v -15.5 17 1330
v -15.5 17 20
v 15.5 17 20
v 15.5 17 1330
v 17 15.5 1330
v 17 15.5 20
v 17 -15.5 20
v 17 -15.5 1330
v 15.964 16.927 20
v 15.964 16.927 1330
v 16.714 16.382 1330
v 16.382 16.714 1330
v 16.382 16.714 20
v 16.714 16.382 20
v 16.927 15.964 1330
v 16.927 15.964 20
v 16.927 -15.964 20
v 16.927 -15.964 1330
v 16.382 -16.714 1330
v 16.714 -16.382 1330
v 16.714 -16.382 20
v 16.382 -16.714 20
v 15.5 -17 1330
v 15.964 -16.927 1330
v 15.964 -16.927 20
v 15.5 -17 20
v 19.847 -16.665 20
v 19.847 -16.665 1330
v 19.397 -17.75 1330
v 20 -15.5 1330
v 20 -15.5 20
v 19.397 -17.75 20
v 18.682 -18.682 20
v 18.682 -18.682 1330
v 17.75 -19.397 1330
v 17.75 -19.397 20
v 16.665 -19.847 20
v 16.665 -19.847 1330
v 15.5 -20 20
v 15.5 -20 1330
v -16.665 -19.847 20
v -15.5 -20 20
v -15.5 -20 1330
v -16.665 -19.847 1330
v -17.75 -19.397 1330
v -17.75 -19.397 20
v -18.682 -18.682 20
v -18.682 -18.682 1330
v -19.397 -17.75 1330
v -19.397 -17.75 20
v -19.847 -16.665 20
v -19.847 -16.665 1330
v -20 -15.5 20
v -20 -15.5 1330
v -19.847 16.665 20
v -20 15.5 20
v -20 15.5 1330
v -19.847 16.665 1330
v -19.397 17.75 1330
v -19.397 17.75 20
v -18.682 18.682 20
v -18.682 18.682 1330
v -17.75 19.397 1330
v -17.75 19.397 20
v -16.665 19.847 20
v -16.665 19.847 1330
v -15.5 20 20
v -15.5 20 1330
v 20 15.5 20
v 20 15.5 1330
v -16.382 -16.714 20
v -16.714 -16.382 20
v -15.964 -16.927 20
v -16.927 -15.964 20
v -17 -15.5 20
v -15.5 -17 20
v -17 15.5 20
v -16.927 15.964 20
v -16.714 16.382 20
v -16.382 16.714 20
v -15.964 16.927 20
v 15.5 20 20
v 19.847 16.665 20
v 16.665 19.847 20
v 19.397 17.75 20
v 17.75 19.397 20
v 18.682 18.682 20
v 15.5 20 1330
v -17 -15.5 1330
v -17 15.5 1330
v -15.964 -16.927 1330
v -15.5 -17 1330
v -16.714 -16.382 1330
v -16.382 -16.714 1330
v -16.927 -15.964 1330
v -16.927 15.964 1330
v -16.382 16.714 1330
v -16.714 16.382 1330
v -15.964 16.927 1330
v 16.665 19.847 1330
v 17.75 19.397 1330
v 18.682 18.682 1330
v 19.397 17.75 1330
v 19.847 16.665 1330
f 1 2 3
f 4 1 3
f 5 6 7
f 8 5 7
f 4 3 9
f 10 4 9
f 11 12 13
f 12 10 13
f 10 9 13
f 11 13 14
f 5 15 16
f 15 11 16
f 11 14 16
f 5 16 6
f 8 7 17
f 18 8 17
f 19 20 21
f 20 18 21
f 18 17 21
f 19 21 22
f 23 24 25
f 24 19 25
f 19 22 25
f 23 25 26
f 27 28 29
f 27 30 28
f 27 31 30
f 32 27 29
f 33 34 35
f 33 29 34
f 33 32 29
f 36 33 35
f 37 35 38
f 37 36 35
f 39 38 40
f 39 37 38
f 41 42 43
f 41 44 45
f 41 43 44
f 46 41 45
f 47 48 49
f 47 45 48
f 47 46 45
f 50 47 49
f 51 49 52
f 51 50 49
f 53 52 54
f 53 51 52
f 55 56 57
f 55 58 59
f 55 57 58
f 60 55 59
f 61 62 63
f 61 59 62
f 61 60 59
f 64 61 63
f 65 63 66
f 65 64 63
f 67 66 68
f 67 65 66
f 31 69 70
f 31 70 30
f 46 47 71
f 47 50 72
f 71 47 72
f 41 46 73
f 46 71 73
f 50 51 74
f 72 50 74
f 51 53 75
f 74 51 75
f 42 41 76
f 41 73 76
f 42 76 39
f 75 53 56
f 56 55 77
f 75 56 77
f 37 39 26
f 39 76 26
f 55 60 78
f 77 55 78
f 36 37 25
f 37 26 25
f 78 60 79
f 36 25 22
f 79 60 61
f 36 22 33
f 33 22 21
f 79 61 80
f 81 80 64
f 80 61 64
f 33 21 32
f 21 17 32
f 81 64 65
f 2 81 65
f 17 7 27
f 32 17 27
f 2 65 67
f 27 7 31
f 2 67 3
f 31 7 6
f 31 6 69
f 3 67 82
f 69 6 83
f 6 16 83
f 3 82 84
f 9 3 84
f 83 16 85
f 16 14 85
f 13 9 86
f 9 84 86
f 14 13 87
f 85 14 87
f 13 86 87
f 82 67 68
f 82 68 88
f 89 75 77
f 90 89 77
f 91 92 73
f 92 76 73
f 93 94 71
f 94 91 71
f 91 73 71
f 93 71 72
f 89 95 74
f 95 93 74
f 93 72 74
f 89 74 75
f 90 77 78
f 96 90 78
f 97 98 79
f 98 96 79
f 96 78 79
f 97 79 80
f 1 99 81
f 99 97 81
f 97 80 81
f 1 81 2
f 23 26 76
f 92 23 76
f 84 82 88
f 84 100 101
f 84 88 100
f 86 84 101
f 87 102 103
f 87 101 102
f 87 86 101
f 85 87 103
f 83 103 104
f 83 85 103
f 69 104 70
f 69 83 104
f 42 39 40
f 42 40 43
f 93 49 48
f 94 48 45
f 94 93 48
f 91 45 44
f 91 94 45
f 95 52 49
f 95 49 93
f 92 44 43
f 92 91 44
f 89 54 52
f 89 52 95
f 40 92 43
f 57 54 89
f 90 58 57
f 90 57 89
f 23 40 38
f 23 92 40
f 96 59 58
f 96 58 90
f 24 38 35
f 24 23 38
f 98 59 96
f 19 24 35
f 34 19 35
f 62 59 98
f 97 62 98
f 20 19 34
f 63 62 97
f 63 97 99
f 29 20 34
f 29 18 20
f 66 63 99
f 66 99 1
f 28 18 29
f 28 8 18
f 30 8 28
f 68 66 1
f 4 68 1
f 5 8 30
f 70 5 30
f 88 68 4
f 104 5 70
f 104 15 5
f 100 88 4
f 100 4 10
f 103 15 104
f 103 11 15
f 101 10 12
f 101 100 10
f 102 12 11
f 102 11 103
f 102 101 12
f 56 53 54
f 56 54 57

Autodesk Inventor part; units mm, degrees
ref_plane "Start Plane" through (0, 0, 20) normal (0, 0, 1) x (1, 0, 0)
ref_plane "End Plane" through (0, 0, 1330) normal (0, 0, 1) x (1, 0, 0)
sketch "Sketch" plane through (0, 0, 0) normal (0, 0, 1) x (1, 0, 0)
  line L0 (-20, -15.5) -> (-20, 15.5)
  line L1 (-15.5, 20) -> (15.5, 20)
  line L2 (20, 15.5) -> (20, -15.5)
  line L3 (15.5, -20) -> (-15.5, -20)
  arc A0 (-20, -15.5) -> (-15.5, -20) centre (-15.5, -15.5) ccw
  arc A1 (-15.5, 20) -> (-20, 15.5) centre (-15.5, 15.5) ccw
  arc A2 (20, 15.5) -> (15.5, 20) centre (15.5, 15.5) ccw
  arc A3 (15.5, -20) -> (20, -15.5) centre (15.5, -15.5) ccw
  arc A4 (-15.5, 17) -> (-17, 15.5) centre (-15.5, 15.5) ccw
  line L4 (-15.5, 17) -> (15.5, 17)
  arc A5 (17, 15.5) -> (15.5, 17) centre (15.5, 15.5) ccw
  line L5 (17, 15.5) -> (17, -15.5)
  arc A6 (15.5, -17) -> (17, -15.5) centre (15.5, -15.5) ccw
  line L6 (15.5, -17) -> (-15.5, -17)
  arc A7 (-17, -15.5) -> (-15.5, -17) centre (-15.5, -15.5) ccw
  line L7 (-17, -15.5) -> (-17, 15.5)
  line L8 (0, 29.3048) -> (0, -29.3048) construction
  line L9 (-29.3048, 0) -> (29.3048, 0) construction
  dimension "d7" = 4.5
  dimension "d10" = 40
  dimension "d11" = 40
  dimension "d12" = 3
  dimension "d15" = 20
  dimension "d16" = 20
extrude "Body" add sketch "Sketch" along normal up to surface (1310 mm away) from surface at 20
sketch "Sketch3" plane through (0, 0, 0) normal (0, 0, 1) x (1, 0, 0)
  line L0 (0, 0) -> (10, 0)
ref_plane "Work Plane3" through (0, 0, 0) normal (0, -1, 0) x (1, 0, 0)
ref_plane "Work Plane4" through (0, -984.5, 1330) normal (0, 0, 1) x (1, 0, 0)
split "Split1" plane through (0, -984.5, 1330) removes the side toward (0, 0, 1)
ref_plane "Work Plane5" through (0, -15.5, 20) normal (0, 0, -1) x (-1, 0, 0)
split "Split2" plane through (0, -15.5, 20) removes the side toward (0, 0, -1)
sketch "Sketch4" plane through (0, 0, 0) normal (0, -1, 0) x (1, 0, 0)
  line L0 (-2, 20) -> (12, 20) projected
  line L1 (-2, 1330) -> (12, 1330) projected
  dimension "d18" = 1310
equation "\"d7\" = G_IR"
equation "\"d10\" = G_H"
equation "\"d11\" = G_W"
equation "\"d12\" = G_T"
equation "\"d15\" = 0.5 * d10"
equation "\"d16\" = 0.5 * d11"
equation "\"d3\" = G_L"
equation "\"G_W\" = 40"
equation "\"G_H\" = 40"
equation "\"G_T\" = 3"
equation "\"G_IR\" = 4.5"
equation "\"G_L\" = d18"
properties part number "ISO 12633-2 - 40x40x3 - 1310" material "Steel, Mild"
